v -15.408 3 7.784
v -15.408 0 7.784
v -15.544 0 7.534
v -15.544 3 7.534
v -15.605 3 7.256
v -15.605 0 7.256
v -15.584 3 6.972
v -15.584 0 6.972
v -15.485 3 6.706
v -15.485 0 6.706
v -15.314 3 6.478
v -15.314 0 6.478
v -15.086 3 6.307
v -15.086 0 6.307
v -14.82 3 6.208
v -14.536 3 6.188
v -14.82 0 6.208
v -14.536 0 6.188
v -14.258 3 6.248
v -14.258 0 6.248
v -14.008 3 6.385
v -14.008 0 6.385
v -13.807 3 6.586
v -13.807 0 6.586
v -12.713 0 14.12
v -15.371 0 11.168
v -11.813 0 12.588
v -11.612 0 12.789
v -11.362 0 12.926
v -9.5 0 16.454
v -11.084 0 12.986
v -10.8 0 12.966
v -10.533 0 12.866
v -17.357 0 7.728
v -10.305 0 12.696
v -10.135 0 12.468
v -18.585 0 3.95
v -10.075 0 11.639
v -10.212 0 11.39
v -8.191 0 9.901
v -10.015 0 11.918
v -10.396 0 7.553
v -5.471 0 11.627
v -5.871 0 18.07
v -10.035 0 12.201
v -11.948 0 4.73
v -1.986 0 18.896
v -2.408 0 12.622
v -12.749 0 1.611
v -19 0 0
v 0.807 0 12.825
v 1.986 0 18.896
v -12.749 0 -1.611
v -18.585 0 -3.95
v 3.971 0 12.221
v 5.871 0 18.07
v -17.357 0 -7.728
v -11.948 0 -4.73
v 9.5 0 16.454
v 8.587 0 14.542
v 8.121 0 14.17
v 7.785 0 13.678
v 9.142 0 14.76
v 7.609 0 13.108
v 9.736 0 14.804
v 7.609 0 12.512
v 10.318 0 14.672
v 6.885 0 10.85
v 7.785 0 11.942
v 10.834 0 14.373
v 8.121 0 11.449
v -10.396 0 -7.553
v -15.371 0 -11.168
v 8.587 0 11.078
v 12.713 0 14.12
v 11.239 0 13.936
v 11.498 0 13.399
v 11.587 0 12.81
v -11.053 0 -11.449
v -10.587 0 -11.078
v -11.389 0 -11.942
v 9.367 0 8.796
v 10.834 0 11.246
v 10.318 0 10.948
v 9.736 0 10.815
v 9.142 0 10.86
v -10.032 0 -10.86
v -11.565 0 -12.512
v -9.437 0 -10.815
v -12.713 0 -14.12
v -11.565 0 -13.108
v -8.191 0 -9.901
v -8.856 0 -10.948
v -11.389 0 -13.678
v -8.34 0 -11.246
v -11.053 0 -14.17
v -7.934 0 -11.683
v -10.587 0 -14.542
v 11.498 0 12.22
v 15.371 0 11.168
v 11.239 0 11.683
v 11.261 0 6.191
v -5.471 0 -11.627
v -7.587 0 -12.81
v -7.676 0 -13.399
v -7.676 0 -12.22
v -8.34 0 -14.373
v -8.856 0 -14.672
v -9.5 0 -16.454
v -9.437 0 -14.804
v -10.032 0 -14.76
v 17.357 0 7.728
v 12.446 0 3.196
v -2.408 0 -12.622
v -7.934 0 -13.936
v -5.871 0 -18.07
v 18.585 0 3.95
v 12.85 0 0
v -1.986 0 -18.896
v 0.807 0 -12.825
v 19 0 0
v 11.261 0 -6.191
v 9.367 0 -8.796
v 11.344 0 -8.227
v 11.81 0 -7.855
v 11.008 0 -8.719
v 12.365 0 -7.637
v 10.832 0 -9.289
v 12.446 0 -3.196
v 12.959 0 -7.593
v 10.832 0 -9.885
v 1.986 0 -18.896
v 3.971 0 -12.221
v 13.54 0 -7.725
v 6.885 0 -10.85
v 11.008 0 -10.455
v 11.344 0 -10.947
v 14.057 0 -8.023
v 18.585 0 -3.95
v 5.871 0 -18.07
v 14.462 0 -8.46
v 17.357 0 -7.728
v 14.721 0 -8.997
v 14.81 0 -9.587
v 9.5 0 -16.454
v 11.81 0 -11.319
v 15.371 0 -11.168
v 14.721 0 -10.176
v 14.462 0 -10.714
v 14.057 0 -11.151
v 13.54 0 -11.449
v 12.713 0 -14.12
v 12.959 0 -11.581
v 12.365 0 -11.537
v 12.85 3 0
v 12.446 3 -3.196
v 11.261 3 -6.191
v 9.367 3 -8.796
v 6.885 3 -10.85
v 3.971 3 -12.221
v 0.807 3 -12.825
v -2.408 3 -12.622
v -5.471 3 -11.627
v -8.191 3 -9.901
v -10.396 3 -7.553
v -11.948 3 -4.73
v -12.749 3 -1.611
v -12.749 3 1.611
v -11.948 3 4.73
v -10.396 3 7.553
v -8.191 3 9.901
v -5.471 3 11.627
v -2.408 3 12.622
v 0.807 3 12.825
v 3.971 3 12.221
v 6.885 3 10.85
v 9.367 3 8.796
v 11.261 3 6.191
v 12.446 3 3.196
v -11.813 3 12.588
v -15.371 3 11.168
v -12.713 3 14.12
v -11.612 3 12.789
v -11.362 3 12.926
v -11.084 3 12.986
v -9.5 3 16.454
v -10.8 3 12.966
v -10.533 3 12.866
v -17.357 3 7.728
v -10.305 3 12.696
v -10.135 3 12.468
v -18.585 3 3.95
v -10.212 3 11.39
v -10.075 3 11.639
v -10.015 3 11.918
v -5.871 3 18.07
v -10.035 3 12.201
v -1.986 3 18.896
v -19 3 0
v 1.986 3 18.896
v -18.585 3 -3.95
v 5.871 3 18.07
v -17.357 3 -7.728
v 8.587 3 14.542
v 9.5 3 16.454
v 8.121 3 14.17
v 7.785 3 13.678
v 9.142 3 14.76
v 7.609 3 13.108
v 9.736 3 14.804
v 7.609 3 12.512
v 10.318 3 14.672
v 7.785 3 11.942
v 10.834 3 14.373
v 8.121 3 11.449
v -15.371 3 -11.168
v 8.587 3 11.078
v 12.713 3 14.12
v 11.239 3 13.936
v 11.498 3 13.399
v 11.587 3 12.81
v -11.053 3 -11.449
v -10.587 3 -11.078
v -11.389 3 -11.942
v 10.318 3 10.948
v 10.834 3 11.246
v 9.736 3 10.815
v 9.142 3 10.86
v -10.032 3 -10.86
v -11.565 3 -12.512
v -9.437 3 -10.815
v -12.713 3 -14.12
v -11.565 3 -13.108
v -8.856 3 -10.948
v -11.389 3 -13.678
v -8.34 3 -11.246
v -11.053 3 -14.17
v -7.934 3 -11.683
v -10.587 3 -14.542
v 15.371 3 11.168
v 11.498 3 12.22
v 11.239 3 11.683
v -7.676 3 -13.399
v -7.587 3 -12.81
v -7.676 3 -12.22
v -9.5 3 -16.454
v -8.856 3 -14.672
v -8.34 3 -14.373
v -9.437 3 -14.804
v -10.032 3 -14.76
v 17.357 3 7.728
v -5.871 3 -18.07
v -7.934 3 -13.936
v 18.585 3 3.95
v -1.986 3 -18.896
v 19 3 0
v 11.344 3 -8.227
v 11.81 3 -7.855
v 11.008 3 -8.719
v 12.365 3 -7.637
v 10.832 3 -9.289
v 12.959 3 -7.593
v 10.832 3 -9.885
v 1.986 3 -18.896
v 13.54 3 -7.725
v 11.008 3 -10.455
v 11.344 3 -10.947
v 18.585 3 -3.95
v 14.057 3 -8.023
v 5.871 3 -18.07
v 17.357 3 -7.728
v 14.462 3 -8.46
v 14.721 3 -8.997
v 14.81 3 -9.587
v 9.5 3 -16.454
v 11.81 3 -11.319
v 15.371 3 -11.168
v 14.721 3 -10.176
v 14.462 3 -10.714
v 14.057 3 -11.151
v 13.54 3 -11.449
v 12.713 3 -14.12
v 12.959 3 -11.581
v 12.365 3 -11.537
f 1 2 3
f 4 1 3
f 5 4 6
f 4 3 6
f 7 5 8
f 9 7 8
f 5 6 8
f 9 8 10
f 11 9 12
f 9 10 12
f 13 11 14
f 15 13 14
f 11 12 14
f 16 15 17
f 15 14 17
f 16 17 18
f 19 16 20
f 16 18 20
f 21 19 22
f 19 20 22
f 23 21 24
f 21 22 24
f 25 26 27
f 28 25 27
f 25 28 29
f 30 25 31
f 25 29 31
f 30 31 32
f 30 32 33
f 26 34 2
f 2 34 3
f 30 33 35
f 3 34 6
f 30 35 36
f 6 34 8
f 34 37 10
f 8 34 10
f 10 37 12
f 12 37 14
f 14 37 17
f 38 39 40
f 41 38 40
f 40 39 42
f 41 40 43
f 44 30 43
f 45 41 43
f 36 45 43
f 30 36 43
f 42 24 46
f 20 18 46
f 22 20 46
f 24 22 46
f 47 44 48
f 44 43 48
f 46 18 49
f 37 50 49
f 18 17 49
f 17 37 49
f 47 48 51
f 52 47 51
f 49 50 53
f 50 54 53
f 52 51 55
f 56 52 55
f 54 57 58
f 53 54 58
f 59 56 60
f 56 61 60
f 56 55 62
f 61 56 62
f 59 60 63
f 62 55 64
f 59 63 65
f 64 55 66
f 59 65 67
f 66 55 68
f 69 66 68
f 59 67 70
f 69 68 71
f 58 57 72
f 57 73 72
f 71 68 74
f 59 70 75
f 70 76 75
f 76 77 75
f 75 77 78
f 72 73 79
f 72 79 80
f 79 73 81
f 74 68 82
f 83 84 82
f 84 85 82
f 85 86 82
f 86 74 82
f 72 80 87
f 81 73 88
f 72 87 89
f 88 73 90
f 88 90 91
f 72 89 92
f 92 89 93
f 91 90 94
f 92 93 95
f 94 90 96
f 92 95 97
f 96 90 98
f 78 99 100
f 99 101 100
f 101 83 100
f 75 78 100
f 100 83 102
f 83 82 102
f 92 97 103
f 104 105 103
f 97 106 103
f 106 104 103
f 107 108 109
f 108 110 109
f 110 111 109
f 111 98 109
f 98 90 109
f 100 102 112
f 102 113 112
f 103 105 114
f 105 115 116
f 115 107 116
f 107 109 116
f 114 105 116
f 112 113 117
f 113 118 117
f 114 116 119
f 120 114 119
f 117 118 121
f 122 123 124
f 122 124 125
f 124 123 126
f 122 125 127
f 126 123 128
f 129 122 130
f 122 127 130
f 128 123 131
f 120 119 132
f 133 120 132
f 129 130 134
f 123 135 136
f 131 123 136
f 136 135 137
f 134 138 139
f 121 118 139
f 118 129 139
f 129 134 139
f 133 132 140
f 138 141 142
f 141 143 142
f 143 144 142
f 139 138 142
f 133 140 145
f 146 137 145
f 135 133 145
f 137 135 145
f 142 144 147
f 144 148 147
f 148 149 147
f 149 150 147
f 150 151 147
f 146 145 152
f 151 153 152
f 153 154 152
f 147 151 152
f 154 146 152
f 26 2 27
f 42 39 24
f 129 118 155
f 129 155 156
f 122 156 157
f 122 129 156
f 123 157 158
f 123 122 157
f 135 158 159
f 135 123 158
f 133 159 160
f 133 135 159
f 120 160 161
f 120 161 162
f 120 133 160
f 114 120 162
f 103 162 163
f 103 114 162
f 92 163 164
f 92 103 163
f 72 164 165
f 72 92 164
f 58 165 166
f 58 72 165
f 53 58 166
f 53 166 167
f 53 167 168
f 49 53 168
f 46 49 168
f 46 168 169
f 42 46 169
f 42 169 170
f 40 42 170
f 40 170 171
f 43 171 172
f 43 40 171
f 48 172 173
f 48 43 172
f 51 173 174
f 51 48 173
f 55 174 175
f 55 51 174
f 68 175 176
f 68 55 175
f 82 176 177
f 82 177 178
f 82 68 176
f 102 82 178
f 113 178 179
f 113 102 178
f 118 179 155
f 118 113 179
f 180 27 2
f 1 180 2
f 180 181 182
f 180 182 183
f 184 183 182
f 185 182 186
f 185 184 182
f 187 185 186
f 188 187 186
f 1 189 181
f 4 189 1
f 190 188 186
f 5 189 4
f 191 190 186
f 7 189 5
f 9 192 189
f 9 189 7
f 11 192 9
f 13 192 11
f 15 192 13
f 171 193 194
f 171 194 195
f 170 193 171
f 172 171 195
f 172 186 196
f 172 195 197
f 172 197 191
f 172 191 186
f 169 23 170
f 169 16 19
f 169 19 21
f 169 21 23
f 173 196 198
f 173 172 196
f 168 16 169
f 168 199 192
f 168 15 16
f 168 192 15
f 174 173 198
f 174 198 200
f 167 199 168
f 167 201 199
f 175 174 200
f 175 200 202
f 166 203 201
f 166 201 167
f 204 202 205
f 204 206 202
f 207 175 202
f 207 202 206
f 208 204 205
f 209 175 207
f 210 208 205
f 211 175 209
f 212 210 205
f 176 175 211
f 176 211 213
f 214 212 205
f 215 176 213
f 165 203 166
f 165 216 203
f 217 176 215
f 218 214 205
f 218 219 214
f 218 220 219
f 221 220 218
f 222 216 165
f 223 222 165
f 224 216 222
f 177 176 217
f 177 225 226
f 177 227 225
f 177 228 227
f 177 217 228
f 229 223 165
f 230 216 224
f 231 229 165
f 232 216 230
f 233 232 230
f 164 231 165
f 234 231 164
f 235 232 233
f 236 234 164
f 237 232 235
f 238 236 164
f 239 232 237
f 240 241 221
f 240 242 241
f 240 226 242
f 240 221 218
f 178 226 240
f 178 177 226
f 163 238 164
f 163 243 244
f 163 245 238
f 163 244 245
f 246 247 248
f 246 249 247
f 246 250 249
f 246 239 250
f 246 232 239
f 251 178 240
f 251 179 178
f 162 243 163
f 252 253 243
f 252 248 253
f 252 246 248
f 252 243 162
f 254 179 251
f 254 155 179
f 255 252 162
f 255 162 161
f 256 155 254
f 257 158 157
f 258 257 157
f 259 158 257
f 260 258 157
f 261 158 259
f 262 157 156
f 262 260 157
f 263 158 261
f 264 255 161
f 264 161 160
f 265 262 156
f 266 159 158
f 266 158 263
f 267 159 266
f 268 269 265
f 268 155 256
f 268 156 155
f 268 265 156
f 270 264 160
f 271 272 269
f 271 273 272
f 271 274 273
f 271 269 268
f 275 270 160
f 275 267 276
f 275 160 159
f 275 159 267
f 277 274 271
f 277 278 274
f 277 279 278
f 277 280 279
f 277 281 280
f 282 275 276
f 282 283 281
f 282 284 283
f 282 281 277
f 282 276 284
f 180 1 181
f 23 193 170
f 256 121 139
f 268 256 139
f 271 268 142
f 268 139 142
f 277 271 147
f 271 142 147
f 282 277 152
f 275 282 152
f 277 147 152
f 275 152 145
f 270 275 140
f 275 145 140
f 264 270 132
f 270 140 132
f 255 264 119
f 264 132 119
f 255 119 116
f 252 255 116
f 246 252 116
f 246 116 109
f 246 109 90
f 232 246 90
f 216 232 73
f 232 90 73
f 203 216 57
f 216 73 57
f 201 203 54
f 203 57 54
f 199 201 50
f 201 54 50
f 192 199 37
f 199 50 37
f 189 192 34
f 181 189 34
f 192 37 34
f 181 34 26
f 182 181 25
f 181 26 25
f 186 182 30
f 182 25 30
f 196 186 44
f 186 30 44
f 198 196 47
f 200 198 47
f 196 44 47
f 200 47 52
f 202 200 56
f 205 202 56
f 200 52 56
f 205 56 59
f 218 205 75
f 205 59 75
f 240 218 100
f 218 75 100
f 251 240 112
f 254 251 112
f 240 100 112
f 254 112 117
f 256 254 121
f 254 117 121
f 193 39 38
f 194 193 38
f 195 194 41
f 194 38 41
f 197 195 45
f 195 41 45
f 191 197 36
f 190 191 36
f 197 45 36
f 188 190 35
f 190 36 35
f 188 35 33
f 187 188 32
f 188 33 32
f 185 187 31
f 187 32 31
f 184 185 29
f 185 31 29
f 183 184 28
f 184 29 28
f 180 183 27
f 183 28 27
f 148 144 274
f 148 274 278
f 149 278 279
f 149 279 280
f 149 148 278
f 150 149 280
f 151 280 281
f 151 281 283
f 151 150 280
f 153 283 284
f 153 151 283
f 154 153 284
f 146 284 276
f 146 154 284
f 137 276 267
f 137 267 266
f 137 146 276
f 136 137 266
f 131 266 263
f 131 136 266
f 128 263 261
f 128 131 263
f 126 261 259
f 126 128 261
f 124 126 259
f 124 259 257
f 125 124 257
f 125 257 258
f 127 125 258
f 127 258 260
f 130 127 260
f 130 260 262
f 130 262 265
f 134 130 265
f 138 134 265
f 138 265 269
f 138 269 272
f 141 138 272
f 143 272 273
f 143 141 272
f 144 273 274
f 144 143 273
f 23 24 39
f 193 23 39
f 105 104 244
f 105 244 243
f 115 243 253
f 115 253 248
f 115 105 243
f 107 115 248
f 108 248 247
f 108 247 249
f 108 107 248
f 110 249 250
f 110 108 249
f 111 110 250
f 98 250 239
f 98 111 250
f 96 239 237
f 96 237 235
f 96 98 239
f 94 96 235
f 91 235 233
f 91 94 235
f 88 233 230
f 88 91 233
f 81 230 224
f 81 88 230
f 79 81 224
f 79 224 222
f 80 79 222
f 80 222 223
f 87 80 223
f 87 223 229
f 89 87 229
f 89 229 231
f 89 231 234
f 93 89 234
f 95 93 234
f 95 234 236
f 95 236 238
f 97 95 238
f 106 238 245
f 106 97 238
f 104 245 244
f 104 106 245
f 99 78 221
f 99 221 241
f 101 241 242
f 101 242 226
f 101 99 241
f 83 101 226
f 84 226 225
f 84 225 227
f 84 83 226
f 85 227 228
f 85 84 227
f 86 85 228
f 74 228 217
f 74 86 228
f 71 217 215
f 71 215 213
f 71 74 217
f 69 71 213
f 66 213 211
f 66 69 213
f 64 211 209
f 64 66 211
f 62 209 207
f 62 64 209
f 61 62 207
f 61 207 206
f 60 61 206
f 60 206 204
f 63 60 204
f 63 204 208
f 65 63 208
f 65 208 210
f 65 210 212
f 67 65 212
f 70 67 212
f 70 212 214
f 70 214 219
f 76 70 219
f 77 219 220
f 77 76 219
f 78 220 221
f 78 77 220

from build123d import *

# Parameters (mm, degrees)
SKETCH1_R           = 19
SKETCH1_R_2         = 12.85
SKETCH1_R_3         = 2
BOSS_EXTRUDE1_DEPTH = 3


with BuildPart() as part:
    # Sketch1 → Boss-Extrude1 (new body)
    with BuildSketch(Plane(origin=(0, 0, 0), x_dir=(1, 0, 0), z_dir=(0, 1, 0))):
        Circle(SKETCH1_R)
        Circle(SKETCH1_R_2, mode=Mode.SUBTRACT)
        with Locations((-9.586926691, 12.809794558)):
            Circle(SKETCH1_R_3, mode=Mode.SUBTRACT)
        with Locations((12.809794558, 9.586926691)):
            Circle(SKETCH1_R_3, mode=Mode.SUBTRACT)
        with Locations((9.586926691, -12.809794558)):
            Circle(SKETCH1_R_3, mode=Mode.SUBTRACT)
        with BuildLine():
            Line((-11.812857964, -12.587946089), (-15.407955473, -7.784273129))
            ThreePointArc((-15.407955473, -7.784273129), (-15.206526231, -6.384478051), (-13.806731153, -6.585907293))
            Line((-13.806731153, -6.585907293), (-10.211633644, -11.389580252))
            ThreePointArc((-10.211633644, -11.389580252), (-10.413062886, -12.78937533), (-11.812857964, -12.587946089))
        make_face(mode=Mode.SUBTRACT)
    extrude(amount=BOSS_EXTRUDE1_DEPTH)


solid = part.part
